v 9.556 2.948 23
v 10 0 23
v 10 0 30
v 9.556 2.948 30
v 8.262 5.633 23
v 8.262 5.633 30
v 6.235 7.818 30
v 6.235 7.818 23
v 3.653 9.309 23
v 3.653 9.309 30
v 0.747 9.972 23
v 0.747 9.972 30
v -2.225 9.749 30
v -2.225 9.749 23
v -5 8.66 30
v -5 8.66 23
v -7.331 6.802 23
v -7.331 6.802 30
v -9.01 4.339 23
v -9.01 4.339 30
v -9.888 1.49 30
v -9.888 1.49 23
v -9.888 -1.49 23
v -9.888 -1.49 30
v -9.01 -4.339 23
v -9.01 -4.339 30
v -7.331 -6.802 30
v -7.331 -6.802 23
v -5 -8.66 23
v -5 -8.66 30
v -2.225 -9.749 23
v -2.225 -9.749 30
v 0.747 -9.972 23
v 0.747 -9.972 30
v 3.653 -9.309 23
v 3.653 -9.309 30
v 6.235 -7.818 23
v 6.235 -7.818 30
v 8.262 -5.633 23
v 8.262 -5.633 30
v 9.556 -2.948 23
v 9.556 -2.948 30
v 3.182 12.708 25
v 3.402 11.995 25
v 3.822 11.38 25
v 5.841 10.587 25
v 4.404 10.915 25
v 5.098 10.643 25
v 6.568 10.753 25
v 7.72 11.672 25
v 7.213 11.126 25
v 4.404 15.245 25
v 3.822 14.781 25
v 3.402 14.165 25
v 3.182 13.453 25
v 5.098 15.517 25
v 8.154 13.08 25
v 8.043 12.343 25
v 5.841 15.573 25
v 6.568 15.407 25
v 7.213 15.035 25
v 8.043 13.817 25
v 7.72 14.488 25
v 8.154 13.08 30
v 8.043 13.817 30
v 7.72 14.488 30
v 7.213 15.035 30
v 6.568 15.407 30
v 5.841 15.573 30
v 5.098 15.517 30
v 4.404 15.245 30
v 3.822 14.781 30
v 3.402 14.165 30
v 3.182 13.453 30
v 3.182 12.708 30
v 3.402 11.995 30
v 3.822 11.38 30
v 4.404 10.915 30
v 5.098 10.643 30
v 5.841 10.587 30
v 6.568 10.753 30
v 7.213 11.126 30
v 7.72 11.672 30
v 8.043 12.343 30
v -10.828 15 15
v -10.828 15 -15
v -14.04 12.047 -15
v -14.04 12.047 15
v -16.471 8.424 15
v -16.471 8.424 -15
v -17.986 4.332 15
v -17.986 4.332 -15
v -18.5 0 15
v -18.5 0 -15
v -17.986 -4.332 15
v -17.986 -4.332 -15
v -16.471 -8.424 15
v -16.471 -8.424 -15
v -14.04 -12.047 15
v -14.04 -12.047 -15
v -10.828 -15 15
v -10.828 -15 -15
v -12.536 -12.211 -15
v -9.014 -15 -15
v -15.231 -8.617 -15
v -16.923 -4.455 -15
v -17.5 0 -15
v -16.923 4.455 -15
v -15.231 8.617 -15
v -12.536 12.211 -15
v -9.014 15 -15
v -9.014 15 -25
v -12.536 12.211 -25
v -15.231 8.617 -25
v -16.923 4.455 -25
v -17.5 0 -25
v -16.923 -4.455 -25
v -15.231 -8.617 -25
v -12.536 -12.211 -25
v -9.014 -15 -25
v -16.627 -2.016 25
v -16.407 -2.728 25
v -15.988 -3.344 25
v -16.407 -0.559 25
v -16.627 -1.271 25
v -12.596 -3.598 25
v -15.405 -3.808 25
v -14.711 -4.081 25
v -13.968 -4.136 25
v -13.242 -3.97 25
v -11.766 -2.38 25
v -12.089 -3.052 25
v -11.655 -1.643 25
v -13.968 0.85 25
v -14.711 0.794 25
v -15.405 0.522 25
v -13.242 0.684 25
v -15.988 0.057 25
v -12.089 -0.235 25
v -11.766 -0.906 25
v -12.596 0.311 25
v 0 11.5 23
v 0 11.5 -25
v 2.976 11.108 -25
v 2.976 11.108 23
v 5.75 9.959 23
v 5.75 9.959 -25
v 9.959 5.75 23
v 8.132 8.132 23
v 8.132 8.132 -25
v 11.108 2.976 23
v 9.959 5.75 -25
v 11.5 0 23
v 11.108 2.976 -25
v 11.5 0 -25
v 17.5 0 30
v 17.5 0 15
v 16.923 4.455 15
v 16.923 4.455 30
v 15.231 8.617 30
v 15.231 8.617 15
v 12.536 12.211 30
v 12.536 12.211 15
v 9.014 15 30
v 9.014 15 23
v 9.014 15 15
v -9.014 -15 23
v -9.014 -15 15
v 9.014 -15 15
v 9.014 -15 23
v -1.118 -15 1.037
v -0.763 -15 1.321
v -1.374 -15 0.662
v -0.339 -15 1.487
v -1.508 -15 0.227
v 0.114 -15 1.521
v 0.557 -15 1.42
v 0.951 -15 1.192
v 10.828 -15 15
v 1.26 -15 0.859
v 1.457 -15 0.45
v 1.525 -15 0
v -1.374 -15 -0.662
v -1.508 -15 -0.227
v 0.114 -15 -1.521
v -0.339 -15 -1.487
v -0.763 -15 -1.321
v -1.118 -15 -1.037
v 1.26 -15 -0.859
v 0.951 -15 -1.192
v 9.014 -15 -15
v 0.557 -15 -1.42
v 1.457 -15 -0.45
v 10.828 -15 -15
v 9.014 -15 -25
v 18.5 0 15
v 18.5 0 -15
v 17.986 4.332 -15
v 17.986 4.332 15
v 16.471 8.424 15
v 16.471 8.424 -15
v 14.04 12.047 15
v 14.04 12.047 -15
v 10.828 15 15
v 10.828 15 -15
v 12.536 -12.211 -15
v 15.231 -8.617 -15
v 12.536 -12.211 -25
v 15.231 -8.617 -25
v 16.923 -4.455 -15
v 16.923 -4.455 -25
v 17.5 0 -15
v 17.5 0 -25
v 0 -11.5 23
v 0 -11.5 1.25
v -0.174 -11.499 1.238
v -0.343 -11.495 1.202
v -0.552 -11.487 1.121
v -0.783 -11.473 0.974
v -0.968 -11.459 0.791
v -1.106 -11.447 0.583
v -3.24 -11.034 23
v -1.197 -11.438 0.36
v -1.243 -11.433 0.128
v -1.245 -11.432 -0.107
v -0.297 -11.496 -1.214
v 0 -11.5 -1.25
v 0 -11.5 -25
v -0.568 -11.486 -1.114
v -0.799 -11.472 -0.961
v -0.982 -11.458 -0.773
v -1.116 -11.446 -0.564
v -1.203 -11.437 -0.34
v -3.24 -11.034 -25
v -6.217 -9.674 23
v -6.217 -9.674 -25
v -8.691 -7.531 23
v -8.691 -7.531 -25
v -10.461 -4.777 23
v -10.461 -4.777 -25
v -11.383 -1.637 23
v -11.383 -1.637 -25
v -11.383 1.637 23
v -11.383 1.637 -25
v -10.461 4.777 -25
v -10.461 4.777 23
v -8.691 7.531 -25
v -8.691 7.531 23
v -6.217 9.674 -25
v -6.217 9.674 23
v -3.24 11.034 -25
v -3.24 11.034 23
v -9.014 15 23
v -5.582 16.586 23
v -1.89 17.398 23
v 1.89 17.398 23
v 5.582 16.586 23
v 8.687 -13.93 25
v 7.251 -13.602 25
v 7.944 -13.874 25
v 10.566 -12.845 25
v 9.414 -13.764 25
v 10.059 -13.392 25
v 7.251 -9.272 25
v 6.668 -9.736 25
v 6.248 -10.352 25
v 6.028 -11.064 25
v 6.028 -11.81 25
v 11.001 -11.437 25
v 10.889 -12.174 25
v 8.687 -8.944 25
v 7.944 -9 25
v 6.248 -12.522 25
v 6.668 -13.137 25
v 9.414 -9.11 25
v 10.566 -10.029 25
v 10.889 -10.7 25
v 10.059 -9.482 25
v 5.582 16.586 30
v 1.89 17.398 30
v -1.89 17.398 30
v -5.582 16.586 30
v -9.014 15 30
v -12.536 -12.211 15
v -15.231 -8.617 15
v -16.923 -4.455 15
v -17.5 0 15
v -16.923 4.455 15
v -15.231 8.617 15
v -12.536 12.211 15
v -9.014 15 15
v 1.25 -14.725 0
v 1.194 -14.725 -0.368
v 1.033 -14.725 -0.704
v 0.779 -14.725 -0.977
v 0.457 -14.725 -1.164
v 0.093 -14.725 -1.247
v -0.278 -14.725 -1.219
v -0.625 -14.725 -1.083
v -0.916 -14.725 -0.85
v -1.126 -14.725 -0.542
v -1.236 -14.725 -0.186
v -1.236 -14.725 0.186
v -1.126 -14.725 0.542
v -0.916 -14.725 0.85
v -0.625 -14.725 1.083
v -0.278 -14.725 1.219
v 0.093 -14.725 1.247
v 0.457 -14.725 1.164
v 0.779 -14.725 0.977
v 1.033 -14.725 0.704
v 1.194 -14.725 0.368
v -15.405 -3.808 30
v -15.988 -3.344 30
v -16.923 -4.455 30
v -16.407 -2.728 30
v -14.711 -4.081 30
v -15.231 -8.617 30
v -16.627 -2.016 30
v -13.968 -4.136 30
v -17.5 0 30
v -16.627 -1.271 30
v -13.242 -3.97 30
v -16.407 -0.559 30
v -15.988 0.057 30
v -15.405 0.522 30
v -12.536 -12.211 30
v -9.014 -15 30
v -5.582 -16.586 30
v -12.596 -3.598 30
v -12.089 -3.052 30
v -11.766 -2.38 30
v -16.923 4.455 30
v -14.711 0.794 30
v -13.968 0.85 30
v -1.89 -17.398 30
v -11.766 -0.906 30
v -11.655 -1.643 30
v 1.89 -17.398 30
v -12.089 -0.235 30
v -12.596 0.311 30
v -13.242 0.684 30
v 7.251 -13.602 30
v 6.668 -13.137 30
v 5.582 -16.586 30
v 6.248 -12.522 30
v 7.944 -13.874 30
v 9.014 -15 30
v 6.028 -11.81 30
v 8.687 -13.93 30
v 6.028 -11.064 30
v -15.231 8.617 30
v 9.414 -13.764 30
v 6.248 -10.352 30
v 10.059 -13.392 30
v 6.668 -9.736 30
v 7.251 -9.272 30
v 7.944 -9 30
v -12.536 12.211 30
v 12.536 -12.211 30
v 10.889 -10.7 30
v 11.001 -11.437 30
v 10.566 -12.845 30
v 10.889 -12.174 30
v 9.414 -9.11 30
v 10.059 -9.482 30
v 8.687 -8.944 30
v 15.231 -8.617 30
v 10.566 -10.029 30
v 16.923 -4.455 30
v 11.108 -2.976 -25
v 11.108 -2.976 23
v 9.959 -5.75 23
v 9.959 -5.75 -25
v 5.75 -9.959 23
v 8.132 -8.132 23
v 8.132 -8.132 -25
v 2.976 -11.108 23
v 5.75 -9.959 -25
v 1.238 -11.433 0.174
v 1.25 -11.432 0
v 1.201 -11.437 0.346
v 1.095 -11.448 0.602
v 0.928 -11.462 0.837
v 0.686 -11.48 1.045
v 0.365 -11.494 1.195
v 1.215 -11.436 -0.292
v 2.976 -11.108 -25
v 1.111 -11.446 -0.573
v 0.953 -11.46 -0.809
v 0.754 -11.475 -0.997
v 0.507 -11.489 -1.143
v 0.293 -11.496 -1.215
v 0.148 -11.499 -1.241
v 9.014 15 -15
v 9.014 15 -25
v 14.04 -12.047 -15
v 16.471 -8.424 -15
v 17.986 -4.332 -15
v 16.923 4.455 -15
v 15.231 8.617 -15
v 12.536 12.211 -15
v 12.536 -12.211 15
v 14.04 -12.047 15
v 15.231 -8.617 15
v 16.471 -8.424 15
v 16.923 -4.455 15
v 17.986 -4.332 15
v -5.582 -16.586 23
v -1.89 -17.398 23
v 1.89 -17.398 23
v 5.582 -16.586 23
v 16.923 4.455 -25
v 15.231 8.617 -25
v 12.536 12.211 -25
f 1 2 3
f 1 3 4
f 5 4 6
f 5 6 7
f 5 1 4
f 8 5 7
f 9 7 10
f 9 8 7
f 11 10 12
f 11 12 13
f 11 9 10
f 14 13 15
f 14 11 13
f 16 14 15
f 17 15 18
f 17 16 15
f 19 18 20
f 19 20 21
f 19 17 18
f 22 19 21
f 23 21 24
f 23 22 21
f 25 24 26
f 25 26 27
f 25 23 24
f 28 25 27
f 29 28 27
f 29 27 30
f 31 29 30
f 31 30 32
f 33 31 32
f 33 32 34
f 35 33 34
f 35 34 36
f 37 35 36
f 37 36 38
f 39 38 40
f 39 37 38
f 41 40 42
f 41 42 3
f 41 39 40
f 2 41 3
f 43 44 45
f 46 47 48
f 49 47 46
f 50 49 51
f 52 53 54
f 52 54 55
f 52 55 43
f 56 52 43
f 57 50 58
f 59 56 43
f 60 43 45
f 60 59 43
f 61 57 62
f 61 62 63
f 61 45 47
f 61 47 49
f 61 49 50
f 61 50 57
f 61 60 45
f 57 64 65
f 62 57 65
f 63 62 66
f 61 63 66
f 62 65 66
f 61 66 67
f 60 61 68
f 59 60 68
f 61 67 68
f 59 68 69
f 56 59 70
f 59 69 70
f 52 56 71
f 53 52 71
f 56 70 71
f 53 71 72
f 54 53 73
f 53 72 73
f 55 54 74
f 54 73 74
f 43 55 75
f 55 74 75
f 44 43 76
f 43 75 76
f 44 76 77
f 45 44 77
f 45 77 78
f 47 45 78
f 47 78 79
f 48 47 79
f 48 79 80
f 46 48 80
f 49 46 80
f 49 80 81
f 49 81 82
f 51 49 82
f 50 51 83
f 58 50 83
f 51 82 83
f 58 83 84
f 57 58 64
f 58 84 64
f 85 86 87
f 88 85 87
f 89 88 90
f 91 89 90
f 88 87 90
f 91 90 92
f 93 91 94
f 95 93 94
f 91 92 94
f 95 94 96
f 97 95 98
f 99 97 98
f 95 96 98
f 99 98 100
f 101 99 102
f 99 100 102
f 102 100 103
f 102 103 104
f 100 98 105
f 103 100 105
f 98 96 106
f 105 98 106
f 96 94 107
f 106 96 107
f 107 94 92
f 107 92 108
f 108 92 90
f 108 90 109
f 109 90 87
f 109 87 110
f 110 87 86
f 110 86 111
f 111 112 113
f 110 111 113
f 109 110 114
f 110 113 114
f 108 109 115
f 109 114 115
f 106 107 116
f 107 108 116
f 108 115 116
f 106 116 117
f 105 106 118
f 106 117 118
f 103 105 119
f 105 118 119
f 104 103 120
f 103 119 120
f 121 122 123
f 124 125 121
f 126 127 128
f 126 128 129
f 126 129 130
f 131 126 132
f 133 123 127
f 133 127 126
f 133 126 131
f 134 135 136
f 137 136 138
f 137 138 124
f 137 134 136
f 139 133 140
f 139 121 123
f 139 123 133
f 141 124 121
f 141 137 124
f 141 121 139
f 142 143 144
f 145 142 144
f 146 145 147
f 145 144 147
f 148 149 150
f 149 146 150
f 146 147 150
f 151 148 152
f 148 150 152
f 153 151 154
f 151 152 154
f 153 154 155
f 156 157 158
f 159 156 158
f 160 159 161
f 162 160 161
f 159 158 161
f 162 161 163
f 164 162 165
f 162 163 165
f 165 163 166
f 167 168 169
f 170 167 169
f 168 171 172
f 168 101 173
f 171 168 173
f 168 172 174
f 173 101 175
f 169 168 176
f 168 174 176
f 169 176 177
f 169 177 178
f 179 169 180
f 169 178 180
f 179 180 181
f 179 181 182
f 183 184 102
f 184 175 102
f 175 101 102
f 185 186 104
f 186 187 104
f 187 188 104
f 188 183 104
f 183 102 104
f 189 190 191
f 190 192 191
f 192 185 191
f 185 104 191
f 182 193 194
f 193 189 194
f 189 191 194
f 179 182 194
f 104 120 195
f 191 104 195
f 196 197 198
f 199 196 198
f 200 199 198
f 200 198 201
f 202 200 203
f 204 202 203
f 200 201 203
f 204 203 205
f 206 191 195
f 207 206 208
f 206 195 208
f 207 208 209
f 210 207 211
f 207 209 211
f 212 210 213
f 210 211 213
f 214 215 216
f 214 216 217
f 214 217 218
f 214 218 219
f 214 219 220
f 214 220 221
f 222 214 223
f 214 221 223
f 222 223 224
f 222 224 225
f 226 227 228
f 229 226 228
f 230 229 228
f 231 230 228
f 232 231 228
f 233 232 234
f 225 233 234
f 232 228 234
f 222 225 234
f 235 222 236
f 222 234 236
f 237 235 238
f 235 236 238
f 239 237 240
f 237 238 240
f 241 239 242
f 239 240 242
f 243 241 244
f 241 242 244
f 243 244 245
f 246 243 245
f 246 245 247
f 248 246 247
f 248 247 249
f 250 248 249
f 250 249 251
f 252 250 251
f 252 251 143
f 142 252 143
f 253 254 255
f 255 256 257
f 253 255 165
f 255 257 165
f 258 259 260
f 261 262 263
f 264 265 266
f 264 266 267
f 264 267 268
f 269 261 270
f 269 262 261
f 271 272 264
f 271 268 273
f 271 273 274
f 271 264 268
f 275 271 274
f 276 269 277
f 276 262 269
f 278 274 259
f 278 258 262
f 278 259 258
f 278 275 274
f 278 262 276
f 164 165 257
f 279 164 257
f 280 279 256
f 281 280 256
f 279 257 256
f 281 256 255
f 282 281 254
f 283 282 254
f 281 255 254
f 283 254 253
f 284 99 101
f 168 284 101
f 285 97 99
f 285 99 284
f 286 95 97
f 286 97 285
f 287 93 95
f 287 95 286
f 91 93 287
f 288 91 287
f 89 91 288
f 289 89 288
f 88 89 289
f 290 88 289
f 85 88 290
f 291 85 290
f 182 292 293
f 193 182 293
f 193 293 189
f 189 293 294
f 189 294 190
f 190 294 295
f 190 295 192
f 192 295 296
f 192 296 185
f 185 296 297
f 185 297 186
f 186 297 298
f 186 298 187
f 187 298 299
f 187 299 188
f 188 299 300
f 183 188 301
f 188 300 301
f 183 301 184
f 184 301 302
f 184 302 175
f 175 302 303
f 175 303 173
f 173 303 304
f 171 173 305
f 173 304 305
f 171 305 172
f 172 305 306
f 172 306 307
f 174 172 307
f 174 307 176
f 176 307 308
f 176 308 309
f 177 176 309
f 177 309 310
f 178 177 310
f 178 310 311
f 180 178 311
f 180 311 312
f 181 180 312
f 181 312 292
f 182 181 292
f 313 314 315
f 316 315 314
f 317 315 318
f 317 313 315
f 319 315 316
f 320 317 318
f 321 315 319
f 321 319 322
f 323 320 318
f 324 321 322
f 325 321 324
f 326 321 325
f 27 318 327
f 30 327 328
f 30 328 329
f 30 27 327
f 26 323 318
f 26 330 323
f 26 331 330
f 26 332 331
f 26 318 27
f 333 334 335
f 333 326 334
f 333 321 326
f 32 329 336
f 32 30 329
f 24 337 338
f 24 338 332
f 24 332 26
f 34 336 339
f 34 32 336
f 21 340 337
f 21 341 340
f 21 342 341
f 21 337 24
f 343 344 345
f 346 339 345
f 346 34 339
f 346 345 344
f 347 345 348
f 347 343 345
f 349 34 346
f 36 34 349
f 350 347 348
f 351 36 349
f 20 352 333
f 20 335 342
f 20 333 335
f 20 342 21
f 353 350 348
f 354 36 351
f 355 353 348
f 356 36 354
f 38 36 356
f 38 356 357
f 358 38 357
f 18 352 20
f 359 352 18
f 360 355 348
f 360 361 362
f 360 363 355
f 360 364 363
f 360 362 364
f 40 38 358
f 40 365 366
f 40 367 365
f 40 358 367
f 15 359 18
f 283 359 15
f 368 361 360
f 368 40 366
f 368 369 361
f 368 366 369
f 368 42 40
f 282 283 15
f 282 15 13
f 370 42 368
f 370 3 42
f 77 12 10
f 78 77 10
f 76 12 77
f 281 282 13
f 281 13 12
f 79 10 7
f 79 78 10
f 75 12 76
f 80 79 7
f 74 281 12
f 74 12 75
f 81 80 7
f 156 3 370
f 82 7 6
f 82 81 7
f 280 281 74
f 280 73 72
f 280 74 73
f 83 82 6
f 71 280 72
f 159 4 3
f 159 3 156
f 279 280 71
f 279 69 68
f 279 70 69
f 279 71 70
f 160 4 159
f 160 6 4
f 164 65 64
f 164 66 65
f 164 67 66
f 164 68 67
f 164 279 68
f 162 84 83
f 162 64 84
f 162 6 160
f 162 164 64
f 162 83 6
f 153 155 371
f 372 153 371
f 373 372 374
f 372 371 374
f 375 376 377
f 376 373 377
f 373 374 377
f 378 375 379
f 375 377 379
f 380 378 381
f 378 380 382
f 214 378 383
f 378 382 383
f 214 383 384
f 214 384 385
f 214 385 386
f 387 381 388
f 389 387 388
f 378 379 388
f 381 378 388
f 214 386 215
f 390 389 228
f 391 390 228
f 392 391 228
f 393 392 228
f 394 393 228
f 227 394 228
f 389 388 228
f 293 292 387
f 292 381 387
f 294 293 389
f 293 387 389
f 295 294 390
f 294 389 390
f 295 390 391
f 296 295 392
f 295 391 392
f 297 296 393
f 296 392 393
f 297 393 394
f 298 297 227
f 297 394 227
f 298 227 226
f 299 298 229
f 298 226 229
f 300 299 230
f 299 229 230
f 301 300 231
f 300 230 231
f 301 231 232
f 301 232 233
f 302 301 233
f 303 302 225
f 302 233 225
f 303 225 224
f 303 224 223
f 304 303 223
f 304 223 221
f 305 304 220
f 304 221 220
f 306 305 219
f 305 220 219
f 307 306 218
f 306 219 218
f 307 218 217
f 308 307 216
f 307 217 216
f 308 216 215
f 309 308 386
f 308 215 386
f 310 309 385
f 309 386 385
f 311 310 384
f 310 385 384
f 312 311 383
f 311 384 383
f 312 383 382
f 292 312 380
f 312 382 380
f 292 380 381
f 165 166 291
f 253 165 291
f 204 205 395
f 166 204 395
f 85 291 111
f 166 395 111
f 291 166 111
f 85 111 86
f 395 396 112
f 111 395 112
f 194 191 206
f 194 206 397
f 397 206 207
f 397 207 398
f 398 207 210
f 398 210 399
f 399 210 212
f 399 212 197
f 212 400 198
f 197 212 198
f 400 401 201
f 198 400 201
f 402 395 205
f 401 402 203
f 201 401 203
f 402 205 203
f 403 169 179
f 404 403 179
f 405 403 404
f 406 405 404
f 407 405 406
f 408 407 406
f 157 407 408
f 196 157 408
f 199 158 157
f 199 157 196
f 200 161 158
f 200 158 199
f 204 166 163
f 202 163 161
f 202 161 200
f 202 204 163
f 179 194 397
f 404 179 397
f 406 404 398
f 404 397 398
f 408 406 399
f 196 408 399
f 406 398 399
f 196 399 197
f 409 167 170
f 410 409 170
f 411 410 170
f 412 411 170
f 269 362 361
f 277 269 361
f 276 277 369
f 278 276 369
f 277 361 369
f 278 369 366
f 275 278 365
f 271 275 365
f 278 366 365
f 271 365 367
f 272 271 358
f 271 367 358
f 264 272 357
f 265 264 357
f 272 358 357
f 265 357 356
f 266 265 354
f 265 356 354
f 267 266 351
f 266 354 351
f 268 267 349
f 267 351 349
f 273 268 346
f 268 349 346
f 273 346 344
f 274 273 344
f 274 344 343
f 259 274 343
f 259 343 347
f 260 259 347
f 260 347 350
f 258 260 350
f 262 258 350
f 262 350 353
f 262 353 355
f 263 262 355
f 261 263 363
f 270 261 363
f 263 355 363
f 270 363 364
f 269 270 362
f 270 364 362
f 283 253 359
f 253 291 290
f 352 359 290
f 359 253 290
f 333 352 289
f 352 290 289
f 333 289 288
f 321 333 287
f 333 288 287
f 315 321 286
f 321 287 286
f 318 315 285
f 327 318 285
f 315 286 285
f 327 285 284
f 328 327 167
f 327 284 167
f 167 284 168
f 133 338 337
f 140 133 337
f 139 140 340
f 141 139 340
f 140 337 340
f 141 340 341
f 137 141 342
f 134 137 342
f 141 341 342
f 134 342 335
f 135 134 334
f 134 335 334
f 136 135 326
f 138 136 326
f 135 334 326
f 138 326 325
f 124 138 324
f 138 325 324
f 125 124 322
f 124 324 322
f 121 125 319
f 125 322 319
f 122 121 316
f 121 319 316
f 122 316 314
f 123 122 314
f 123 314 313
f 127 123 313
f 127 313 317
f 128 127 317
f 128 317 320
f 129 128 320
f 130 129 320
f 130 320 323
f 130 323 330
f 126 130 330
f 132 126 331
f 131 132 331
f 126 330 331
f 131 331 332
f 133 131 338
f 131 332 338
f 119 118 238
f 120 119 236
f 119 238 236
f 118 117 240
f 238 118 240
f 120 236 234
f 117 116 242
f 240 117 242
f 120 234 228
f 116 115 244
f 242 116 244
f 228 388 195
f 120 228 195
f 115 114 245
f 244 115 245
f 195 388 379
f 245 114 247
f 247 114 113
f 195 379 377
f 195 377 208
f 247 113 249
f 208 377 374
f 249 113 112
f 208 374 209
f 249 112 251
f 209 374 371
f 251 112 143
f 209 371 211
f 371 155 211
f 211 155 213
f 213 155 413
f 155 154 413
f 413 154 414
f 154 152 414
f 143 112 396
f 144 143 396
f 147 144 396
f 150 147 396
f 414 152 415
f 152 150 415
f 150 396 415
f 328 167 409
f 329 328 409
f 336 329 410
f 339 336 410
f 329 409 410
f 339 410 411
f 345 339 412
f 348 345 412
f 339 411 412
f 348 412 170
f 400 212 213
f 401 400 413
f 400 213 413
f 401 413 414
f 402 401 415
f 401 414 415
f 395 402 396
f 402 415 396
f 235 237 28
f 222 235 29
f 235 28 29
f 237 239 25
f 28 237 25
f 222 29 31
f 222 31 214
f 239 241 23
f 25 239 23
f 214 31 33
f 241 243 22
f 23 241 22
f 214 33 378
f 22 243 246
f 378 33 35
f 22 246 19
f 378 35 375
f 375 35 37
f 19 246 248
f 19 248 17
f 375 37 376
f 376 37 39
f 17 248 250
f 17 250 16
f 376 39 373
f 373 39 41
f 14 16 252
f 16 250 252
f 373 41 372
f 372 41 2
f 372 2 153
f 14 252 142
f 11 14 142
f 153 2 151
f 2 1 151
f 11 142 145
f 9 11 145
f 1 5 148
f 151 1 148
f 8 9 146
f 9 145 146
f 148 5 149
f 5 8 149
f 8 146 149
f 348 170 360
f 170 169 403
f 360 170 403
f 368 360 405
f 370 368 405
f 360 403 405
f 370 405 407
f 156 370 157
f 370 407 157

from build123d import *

# Parameters (mm, degrees)
BOSS_EXTRUDE1_DEPTH         = 30
BOSS_EXTRUDE1_DEPTH_BACK    = 25
SKETCH1_R                   = 11.5
BOSS_EXTRUDE2_DEPTH         = 15
BOSS_EXTRUDE2_DEPTH_BACK    = 15
BOSS_EXTRUDE3_START         = -7
SKETCH5_R                   = 17.5
SKETCH5_R_2                 = 10
BOSS_EXTRUDE3_DEPTH         = 7
SKETCH6_R                   = 2.5
CUT_EXTRUDE1_DEPTH          = 5
M3_TAPPED_HOLE1_D           = 2.5
M3_TAPPED_HOLE1_DEPTH       = 7.5
M3_TAPPED_HOLE1_CSINK_D     = 3.05
M3_TAPPED_HOLE1_CSINK_ANGLE = 90
M3_TAPPED_HOLE1_TIP         = 0.751075774


with BuildPart() as part:
    # Sketch1 → Boss-Extrude1 (new, two sides: drawn at the far end of the back side and taken through both)
    with BuildSketch(Plane.XY.offset(-BOSS_EXTRUDE1_DEPTH_BACK)):
        with BuildLine():
            Line((9.013878189, 15), (-9.013878189, 15))
            ThreePointArc((-9.013878189, 15), (-17.5, 0), (-9.013878189, -15))
            Line((-9.013878189, -15), (9.013878189, -15))
            ThreePointArc((9.013878189, -15), (17.5, 0), (9.013878189, 15))
        make_face()
        Circle(SKETCH1_R, mode=Mode.SUBTRACT)
    extrude(amount=BOSS_EXTRUDE1_DEPTH + BOSS_EXTRUDE1_DEPTH_BACK)

    # Sketch1<23> → Boss-Extrude2 (add, two sides: drawn at the far end of the back side and taken through both)
    with BuildSketch(Plane.XY.offset(-BOSS_EXTRUDE2_DEPTH_BACK)):
        with BuildLine():
            Line((-9.013878189, 15), (-10.828203914, 15))
            ThreePointArc((-10.828203914, 15), (-18.5, 0), (-10.828203914, -15))
            Line((-10.828203914, -15), (-9.013878189, -15))
            ThreePointArc((-9.013878189, -15), (-17.5, 0), (-9.013878189, 15))
        make_face()
        with BuildLine():
            ThreePointArc((10.828203914, -15), (18.5, 0), (10.828203914, 15))
            Line((10.828203914, 15), (9.013878189, 15))
            ThreePointArc((9.013878189, 15), (17.5, 0), (9.013878189, -15))
            Line((9.013878189, -15), (10.828203914, -15))
        make_face()
    extrude(amount=BOSS_EXTRUDE2_DEPTH + BOSS_EXTRUDE2_DEPTH_BACK)

    # Sketch5 → Boss-Extrude3 (add)
    with BuildSketch(Plane.XY.offset(30).offset(BOSS_EXTRUDE3_START)):
        Circle(SKETCH5_R)
        Circle(SKETCH5_R_2, mode=Mode.SUBTRACT)
    extrude(amount=BOSS_EXTRUDE3_DEPTH)

    # Sketch6 → Cut-Extrude1 (cut)
    with BuildSketch(Plane.XY.offset(30)):
        with Locations((5.654398175, 13.080148366)):
            Circle(SKETCH6_R)
        with Locations((8.500541683, -11.436926646)):
            Circle(SKETCH6_R)
        with Locations((-14.154939858, -1.643221721)):
            Circle(SKETCH6_R)
    extrude(amount=-CUT_EXTRUDE1_DEPTH, mode=Mode.SUBTRACT)

    # M3 Tapped Hole1
    with Locations(Plane(origin=(0, -15, 0), x_dir=(-1, 0, 0), z_dir=(0, -1, 0))):
        with Locations((0, 0)):
            CounterSinkHole(M3_TAPPED_HOLE1_D / 2, M3_TAPPED_HOLE1_CSINK_D / 2, depth=M3_TAPPED_HOLE1_DEPTH, counter_sink_angle=M3_TAPPED_HOLE1_CSINK_ANGLE)
            with Locations((0, 0, -(M3_TAPPED_HOLE1_DEPTH + M3_TAPPED_HOLE1_TIP / 2))):  # 118° drill point
                Cone(0, M3_TAPPED_HOLE1_D / 2, M3_TAPPED_HOLE1_TIP, mode=Mode.SUBTRACT)


solid = part.part
